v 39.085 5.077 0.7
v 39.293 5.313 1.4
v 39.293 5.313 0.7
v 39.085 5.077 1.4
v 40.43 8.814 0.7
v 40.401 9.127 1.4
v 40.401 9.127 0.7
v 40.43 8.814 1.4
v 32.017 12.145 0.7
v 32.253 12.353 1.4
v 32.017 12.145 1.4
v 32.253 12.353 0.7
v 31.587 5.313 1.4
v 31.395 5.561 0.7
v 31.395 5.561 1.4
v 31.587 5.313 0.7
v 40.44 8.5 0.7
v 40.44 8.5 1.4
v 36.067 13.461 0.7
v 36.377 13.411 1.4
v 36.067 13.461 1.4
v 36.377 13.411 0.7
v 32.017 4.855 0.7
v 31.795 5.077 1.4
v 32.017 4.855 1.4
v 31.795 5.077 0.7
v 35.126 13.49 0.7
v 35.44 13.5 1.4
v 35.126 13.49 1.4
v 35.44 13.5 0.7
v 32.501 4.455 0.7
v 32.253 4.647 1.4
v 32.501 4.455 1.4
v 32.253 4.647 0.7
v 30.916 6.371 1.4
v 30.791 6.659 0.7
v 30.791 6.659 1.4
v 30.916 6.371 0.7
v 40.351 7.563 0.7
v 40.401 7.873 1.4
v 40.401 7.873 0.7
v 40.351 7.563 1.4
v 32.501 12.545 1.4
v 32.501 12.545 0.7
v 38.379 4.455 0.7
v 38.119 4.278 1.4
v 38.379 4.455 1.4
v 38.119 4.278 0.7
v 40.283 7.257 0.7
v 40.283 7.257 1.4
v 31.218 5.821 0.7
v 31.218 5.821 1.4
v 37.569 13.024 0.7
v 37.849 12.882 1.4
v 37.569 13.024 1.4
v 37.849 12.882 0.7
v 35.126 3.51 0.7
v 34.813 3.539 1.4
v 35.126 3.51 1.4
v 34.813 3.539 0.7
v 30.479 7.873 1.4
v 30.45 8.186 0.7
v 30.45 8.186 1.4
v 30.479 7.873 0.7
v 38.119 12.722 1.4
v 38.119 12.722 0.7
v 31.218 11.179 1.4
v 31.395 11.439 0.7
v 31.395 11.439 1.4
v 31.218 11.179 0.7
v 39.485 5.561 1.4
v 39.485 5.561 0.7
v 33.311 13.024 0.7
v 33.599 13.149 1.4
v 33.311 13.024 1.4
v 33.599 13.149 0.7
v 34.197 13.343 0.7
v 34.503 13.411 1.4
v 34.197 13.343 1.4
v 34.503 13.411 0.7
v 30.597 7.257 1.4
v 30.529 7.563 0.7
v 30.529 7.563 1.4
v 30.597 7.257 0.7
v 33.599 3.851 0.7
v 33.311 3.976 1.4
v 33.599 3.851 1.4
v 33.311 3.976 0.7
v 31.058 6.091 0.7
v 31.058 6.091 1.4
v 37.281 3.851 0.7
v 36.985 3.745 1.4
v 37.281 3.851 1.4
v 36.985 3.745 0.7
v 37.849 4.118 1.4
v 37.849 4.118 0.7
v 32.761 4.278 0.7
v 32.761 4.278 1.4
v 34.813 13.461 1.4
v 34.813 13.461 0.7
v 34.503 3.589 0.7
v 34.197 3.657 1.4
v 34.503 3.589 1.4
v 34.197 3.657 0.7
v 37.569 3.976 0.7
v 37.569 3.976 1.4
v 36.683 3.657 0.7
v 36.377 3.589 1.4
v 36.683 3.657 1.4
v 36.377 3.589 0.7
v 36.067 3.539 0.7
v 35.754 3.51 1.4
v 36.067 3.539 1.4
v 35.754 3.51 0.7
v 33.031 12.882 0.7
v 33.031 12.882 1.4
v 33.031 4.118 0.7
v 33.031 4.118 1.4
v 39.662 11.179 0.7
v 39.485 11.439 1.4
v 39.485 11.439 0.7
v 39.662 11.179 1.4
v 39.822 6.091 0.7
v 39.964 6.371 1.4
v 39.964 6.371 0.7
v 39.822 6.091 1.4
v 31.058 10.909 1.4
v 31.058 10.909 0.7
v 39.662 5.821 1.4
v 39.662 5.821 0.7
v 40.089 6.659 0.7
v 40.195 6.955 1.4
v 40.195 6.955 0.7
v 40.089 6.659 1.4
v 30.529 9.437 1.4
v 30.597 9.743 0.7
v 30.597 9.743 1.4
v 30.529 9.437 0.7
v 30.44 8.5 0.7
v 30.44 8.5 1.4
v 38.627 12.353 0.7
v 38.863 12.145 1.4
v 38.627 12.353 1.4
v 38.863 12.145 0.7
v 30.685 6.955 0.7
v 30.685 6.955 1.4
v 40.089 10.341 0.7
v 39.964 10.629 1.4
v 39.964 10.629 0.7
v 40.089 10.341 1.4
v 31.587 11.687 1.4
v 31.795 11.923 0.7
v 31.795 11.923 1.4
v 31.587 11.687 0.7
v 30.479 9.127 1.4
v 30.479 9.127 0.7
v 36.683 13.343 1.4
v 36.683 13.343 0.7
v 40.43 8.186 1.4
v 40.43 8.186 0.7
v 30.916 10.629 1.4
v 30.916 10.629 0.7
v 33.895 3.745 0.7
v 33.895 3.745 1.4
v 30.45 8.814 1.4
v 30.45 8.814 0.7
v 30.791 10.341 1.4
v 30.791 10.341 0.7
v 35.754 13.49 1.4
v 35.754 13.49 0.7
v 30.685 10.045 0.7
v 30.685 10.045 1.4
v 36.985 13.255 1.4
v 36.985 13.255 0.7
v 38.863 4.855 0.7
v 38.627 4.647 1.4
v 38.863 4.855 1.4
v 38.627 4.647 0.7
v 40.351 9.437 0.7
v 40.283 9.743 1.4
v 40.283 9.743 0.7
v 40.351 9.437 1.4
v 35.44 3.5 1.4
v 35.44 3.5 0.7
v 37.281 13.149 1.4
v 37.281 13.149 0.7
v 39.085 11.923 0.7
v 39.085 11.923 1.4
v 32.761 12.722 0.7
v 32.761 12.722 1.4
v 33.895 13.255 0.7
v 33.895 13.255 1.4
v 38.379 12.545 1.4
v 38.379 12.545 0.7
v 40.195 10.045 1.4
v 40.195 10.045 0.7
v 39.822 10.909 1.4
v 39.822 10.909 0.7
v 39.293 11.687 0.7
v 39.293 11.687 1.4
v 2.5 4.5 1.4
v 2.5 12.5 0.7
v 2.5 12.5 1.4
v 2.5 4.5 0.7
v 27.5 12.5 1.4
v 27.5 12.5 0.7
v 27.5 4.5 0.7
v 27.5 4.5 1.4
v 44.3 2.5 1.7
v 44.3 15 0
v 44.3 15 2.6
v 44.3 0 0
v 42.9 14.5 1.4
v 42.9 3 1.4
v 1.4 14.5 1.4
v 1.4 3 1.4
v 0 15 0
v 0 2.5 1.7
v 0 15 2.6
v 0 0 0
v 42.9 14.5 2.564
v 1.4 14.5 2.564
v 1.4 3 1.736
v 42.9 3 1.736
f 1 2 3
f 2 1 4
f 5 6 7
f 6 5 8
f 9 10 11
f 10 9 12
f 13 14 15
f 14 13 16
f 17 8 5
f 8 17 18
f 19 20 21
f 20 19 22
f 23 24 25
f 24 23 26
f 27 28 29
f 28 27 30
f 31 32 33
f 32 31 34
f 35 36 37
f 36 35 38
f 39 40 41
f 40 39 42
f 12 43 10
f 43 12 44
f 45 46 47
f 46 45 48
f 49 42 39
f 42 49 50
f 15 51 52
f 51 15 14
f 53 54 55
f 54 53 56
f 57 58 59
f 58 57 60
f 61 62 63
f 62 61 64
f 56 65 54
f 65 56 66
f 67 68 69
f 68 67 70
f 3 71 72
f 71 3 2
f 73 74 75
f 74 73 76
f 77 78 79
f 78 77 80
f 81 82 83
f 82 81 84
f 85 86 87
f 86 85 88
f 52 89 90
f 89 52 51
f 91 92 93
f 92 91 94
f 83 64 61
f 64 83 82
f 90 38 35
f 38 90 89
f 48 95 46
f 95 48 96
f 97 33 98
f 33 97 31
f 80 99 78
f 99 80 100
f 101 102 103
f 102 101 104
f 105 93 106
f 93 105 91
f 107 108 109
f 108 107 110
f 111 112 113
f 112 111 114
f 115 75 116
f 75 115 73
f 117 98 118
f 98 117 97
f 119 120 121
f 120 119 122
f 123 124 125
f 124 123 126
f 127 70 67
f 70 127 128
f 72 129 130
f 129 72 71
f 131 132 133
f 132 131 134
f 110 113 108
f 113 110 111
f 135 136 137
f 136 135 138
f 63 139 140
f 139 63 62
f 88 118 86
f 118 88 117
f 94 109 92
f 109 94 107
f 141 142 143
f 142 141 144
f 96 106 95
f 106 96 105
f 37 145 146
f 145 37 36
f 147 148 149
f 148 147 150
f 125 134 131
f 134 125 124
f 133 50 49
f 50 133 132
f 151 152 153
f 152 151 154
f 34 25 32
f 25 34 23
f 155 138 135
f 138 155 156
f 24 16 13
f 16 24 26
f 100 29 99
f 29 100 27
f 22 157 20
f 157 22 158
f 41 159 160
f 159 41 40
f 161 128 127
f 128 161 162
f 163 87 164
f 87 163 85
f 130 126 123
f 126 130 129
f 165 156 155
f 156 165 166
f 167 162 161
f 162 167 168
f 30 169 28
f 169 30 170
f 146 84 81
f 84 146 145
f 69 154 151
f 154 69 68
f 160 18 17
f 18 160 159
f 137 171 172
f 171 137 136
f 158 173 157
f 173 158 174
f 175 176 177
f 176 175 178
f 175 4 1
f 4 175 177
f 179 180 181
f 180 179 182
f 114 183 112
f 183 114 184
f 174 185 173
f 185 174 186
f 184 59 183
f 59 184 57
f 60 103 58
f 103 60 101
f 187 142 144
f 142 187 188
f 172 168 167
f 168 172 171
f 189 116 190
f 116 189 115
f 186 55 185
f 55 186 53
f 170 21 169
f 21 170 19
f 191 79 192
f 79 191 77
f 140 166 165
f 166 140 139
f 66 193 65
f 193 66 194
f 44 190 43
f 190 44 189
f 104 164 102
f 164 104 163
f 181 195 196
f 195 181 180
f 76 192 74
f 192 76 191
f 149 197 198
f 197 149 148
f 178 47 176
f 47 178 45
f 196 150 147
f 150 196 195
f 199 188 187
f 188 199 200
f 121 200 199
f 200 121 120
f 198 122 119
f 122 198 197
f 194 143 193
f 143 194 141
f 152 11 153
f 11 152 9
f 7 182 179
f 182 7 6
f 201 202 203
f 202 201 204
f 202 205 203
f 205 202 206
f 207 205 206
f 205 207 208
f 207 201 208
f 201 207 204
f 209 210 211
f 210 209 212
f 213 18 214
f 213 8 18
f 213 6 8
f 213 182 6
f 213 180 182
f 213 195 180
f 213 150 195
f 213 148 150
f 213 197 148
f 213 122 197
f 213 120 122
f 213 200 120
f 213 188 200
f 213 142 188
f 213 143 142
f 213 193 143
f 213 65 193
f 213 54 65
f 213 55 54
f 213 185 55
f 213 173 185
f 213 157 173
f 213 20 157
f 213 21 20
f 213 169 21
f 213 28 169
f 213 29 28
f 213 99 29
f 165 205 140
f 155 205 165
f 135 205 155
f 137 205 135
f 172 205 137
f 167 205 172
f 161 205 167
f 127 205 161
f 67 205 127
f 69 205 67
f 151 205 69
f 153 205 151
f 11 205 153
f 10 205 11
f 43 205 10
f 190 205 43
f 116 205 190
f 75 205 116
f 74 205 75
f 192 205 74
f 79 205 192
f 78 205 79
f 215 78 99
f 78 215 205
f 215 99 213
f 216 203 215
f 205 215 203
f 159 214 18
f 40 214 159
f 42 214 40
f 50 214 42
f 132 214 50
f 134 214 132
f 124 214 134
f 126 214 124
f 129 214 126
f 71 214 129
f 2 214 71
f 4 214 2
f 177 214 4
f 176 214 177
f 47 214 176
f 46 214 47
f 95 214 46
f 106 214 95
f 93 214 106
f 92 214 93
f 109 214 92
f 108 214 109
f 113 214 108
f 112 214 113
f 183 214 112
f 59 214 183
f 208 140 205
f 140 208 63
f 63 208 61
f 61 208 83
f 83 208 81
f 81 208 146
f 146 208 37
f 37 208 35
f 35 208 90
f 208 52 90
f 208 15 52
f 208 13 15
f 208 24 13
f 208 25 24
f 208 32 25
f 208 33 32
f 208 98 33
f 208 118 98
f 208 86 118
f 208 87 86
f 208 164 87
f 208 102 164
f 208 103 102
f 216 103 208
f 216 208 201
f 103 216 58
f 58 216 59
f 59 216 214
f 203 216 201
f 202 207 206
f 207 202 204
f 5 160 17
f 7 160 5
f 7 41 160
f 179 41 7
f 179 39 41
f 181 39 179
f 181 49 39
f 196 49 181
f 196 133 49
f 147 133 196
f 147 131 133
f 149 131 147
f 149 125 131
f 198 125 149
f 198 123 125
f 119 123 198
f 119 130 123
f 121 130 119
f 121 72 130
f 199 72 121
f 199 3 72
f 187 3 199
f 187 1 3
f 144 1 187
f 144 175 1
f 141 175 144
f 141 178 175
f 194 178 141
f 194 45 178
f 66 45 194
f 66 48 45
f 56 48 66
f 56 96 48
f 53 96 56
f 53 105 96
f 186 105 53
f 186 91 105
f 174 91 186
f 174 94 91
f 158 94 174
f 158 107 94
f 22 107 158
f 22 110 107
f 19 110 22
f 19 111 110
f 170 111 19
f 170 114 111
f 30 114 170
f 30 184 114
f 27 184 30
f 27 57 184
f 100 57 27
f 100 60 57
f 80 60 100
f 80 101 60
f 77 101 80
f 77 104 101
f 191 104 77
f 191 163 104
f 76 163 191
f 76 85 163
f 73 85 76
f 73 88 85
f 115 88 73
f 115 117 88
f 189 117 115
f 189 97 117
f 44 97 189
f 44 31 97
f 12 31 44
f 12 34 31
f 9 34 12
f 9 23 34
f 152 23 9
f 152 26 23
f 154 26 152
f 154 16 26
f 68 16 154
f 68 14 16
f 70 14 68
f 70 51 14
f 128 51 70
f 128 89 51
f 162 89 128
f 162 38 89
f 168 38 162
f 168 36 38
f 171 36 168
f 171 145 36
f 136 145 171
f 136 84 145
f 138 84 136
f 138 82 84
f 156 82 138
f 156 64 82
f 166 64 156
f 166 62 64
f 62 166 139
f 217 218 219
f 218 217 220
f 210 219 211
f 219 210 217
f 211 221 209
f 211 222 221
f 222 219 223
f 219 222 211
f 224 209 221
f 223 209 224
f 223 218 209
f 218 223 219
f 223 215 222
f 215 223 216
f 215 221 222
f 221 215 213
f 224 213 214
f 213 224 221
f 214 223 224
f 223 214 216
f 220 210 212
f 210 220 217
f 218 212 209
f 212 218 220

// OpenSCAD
module prism(l, a, p){
    points = [[0,0,0],[0,0,a],[l,0,a],[l, 0, 0],[l, p, a],[0,p,a]];
    faces = [[0,1,2,3],[1,5,4,2],[5,4,3,0],[0,1,5],[2,3,4]];
    polyhedron(points = points, faces = faces);
}

module meia_caixa(l, p, a, z){
    translate([0,2.5,z]) color("Cyan") cube([l, p, a/2]);
}

module peca_superior(l, p, a_major, a_minor,){
    points =    [[0,0,0],
                [0,p,0],
                [l,p,0],
                [l,0,0],
                [0,0,a_minor],
                [0,p,a_major],
                [l,p,a_major],
                [l,0,a_minor]];
    faces = [[0,3,2,1],
            [0,4,7,3],
            [4,5,6,7],
            [5,1,2,6],
            [4,0,1,5],
            [2,3,7,6]];
    difference(){
        translate([0,2.5,1.4]) polyhedron(points = points, faces = faces);
        color("Green") extrude_teclado();
        linear_extrude(height = .1, center = false, convexity = 10);
        color("Pink") rotate([90,0,0]) translate([44.3/2 - .2,1.7,-14.9]) square(size=[1.2,.6], center=false);
        linear_extrude(height = .1, center = false, convexity = 10);
        color("Pink") rotate([90,0,0]) translate([44.3/2 +19.5 - .2,1.7,-14.9]) square(size=[1.2,.6], center=false);
    }
}

module apoio(a, l, p){
    points = [[0,0,0],[0,p,a],[l,p,a],[l,0,0],[l,p,0],[0,p,0]];
    faces = [[0,1,2,3],[1,5,4,2],[0,3,4,5],[1,0,5],[3,2,4]];
    color("Blue") polyhedron(points = points, faces = faces);
}

module extrude_teclado(){
    linear_extrude(height = 3.5, center = false, convexity = 10, twist = 0)
    translate([1.4,3,1.8]) square([41.5, 11.5]);
}

module extrude_pockets(){
    difference(){
        linear_extrude(height = 3.5, center = false, convexity = 10, $fn = 100)
        translate([4*(44.3/5),8.5,0]) circle(5);
    }
    difference(){
        linear_extrude(height = 3.5, center = false, convexity = 10)
        translate([2.5,4.5,0]) square([25, 8]);
    }
}

module pockets(){
    color("Red") difference(){
        meia_caixa(44.3, 12.5, 1.4, 1.4/2);
        extrude_pockets();
    }
}

module suporte_teclado(){
        meia_caixa(44.3, 12.5, 1.4, 0);
        pockets();
        peca_superior(44.3,12.5,1.2,0.3);
        apoio(1.7, 44.3, 2.5);   
}


module suporte_trackpad(){
//    meia_caixa(44.3, 12.5, 1.4, 0);
//    pockets();
//    peca_superior(44.3,12.5,1.2,0.3);
//    apoio(1.7, 44.3, 2.5);
}

suporte_teclado();
